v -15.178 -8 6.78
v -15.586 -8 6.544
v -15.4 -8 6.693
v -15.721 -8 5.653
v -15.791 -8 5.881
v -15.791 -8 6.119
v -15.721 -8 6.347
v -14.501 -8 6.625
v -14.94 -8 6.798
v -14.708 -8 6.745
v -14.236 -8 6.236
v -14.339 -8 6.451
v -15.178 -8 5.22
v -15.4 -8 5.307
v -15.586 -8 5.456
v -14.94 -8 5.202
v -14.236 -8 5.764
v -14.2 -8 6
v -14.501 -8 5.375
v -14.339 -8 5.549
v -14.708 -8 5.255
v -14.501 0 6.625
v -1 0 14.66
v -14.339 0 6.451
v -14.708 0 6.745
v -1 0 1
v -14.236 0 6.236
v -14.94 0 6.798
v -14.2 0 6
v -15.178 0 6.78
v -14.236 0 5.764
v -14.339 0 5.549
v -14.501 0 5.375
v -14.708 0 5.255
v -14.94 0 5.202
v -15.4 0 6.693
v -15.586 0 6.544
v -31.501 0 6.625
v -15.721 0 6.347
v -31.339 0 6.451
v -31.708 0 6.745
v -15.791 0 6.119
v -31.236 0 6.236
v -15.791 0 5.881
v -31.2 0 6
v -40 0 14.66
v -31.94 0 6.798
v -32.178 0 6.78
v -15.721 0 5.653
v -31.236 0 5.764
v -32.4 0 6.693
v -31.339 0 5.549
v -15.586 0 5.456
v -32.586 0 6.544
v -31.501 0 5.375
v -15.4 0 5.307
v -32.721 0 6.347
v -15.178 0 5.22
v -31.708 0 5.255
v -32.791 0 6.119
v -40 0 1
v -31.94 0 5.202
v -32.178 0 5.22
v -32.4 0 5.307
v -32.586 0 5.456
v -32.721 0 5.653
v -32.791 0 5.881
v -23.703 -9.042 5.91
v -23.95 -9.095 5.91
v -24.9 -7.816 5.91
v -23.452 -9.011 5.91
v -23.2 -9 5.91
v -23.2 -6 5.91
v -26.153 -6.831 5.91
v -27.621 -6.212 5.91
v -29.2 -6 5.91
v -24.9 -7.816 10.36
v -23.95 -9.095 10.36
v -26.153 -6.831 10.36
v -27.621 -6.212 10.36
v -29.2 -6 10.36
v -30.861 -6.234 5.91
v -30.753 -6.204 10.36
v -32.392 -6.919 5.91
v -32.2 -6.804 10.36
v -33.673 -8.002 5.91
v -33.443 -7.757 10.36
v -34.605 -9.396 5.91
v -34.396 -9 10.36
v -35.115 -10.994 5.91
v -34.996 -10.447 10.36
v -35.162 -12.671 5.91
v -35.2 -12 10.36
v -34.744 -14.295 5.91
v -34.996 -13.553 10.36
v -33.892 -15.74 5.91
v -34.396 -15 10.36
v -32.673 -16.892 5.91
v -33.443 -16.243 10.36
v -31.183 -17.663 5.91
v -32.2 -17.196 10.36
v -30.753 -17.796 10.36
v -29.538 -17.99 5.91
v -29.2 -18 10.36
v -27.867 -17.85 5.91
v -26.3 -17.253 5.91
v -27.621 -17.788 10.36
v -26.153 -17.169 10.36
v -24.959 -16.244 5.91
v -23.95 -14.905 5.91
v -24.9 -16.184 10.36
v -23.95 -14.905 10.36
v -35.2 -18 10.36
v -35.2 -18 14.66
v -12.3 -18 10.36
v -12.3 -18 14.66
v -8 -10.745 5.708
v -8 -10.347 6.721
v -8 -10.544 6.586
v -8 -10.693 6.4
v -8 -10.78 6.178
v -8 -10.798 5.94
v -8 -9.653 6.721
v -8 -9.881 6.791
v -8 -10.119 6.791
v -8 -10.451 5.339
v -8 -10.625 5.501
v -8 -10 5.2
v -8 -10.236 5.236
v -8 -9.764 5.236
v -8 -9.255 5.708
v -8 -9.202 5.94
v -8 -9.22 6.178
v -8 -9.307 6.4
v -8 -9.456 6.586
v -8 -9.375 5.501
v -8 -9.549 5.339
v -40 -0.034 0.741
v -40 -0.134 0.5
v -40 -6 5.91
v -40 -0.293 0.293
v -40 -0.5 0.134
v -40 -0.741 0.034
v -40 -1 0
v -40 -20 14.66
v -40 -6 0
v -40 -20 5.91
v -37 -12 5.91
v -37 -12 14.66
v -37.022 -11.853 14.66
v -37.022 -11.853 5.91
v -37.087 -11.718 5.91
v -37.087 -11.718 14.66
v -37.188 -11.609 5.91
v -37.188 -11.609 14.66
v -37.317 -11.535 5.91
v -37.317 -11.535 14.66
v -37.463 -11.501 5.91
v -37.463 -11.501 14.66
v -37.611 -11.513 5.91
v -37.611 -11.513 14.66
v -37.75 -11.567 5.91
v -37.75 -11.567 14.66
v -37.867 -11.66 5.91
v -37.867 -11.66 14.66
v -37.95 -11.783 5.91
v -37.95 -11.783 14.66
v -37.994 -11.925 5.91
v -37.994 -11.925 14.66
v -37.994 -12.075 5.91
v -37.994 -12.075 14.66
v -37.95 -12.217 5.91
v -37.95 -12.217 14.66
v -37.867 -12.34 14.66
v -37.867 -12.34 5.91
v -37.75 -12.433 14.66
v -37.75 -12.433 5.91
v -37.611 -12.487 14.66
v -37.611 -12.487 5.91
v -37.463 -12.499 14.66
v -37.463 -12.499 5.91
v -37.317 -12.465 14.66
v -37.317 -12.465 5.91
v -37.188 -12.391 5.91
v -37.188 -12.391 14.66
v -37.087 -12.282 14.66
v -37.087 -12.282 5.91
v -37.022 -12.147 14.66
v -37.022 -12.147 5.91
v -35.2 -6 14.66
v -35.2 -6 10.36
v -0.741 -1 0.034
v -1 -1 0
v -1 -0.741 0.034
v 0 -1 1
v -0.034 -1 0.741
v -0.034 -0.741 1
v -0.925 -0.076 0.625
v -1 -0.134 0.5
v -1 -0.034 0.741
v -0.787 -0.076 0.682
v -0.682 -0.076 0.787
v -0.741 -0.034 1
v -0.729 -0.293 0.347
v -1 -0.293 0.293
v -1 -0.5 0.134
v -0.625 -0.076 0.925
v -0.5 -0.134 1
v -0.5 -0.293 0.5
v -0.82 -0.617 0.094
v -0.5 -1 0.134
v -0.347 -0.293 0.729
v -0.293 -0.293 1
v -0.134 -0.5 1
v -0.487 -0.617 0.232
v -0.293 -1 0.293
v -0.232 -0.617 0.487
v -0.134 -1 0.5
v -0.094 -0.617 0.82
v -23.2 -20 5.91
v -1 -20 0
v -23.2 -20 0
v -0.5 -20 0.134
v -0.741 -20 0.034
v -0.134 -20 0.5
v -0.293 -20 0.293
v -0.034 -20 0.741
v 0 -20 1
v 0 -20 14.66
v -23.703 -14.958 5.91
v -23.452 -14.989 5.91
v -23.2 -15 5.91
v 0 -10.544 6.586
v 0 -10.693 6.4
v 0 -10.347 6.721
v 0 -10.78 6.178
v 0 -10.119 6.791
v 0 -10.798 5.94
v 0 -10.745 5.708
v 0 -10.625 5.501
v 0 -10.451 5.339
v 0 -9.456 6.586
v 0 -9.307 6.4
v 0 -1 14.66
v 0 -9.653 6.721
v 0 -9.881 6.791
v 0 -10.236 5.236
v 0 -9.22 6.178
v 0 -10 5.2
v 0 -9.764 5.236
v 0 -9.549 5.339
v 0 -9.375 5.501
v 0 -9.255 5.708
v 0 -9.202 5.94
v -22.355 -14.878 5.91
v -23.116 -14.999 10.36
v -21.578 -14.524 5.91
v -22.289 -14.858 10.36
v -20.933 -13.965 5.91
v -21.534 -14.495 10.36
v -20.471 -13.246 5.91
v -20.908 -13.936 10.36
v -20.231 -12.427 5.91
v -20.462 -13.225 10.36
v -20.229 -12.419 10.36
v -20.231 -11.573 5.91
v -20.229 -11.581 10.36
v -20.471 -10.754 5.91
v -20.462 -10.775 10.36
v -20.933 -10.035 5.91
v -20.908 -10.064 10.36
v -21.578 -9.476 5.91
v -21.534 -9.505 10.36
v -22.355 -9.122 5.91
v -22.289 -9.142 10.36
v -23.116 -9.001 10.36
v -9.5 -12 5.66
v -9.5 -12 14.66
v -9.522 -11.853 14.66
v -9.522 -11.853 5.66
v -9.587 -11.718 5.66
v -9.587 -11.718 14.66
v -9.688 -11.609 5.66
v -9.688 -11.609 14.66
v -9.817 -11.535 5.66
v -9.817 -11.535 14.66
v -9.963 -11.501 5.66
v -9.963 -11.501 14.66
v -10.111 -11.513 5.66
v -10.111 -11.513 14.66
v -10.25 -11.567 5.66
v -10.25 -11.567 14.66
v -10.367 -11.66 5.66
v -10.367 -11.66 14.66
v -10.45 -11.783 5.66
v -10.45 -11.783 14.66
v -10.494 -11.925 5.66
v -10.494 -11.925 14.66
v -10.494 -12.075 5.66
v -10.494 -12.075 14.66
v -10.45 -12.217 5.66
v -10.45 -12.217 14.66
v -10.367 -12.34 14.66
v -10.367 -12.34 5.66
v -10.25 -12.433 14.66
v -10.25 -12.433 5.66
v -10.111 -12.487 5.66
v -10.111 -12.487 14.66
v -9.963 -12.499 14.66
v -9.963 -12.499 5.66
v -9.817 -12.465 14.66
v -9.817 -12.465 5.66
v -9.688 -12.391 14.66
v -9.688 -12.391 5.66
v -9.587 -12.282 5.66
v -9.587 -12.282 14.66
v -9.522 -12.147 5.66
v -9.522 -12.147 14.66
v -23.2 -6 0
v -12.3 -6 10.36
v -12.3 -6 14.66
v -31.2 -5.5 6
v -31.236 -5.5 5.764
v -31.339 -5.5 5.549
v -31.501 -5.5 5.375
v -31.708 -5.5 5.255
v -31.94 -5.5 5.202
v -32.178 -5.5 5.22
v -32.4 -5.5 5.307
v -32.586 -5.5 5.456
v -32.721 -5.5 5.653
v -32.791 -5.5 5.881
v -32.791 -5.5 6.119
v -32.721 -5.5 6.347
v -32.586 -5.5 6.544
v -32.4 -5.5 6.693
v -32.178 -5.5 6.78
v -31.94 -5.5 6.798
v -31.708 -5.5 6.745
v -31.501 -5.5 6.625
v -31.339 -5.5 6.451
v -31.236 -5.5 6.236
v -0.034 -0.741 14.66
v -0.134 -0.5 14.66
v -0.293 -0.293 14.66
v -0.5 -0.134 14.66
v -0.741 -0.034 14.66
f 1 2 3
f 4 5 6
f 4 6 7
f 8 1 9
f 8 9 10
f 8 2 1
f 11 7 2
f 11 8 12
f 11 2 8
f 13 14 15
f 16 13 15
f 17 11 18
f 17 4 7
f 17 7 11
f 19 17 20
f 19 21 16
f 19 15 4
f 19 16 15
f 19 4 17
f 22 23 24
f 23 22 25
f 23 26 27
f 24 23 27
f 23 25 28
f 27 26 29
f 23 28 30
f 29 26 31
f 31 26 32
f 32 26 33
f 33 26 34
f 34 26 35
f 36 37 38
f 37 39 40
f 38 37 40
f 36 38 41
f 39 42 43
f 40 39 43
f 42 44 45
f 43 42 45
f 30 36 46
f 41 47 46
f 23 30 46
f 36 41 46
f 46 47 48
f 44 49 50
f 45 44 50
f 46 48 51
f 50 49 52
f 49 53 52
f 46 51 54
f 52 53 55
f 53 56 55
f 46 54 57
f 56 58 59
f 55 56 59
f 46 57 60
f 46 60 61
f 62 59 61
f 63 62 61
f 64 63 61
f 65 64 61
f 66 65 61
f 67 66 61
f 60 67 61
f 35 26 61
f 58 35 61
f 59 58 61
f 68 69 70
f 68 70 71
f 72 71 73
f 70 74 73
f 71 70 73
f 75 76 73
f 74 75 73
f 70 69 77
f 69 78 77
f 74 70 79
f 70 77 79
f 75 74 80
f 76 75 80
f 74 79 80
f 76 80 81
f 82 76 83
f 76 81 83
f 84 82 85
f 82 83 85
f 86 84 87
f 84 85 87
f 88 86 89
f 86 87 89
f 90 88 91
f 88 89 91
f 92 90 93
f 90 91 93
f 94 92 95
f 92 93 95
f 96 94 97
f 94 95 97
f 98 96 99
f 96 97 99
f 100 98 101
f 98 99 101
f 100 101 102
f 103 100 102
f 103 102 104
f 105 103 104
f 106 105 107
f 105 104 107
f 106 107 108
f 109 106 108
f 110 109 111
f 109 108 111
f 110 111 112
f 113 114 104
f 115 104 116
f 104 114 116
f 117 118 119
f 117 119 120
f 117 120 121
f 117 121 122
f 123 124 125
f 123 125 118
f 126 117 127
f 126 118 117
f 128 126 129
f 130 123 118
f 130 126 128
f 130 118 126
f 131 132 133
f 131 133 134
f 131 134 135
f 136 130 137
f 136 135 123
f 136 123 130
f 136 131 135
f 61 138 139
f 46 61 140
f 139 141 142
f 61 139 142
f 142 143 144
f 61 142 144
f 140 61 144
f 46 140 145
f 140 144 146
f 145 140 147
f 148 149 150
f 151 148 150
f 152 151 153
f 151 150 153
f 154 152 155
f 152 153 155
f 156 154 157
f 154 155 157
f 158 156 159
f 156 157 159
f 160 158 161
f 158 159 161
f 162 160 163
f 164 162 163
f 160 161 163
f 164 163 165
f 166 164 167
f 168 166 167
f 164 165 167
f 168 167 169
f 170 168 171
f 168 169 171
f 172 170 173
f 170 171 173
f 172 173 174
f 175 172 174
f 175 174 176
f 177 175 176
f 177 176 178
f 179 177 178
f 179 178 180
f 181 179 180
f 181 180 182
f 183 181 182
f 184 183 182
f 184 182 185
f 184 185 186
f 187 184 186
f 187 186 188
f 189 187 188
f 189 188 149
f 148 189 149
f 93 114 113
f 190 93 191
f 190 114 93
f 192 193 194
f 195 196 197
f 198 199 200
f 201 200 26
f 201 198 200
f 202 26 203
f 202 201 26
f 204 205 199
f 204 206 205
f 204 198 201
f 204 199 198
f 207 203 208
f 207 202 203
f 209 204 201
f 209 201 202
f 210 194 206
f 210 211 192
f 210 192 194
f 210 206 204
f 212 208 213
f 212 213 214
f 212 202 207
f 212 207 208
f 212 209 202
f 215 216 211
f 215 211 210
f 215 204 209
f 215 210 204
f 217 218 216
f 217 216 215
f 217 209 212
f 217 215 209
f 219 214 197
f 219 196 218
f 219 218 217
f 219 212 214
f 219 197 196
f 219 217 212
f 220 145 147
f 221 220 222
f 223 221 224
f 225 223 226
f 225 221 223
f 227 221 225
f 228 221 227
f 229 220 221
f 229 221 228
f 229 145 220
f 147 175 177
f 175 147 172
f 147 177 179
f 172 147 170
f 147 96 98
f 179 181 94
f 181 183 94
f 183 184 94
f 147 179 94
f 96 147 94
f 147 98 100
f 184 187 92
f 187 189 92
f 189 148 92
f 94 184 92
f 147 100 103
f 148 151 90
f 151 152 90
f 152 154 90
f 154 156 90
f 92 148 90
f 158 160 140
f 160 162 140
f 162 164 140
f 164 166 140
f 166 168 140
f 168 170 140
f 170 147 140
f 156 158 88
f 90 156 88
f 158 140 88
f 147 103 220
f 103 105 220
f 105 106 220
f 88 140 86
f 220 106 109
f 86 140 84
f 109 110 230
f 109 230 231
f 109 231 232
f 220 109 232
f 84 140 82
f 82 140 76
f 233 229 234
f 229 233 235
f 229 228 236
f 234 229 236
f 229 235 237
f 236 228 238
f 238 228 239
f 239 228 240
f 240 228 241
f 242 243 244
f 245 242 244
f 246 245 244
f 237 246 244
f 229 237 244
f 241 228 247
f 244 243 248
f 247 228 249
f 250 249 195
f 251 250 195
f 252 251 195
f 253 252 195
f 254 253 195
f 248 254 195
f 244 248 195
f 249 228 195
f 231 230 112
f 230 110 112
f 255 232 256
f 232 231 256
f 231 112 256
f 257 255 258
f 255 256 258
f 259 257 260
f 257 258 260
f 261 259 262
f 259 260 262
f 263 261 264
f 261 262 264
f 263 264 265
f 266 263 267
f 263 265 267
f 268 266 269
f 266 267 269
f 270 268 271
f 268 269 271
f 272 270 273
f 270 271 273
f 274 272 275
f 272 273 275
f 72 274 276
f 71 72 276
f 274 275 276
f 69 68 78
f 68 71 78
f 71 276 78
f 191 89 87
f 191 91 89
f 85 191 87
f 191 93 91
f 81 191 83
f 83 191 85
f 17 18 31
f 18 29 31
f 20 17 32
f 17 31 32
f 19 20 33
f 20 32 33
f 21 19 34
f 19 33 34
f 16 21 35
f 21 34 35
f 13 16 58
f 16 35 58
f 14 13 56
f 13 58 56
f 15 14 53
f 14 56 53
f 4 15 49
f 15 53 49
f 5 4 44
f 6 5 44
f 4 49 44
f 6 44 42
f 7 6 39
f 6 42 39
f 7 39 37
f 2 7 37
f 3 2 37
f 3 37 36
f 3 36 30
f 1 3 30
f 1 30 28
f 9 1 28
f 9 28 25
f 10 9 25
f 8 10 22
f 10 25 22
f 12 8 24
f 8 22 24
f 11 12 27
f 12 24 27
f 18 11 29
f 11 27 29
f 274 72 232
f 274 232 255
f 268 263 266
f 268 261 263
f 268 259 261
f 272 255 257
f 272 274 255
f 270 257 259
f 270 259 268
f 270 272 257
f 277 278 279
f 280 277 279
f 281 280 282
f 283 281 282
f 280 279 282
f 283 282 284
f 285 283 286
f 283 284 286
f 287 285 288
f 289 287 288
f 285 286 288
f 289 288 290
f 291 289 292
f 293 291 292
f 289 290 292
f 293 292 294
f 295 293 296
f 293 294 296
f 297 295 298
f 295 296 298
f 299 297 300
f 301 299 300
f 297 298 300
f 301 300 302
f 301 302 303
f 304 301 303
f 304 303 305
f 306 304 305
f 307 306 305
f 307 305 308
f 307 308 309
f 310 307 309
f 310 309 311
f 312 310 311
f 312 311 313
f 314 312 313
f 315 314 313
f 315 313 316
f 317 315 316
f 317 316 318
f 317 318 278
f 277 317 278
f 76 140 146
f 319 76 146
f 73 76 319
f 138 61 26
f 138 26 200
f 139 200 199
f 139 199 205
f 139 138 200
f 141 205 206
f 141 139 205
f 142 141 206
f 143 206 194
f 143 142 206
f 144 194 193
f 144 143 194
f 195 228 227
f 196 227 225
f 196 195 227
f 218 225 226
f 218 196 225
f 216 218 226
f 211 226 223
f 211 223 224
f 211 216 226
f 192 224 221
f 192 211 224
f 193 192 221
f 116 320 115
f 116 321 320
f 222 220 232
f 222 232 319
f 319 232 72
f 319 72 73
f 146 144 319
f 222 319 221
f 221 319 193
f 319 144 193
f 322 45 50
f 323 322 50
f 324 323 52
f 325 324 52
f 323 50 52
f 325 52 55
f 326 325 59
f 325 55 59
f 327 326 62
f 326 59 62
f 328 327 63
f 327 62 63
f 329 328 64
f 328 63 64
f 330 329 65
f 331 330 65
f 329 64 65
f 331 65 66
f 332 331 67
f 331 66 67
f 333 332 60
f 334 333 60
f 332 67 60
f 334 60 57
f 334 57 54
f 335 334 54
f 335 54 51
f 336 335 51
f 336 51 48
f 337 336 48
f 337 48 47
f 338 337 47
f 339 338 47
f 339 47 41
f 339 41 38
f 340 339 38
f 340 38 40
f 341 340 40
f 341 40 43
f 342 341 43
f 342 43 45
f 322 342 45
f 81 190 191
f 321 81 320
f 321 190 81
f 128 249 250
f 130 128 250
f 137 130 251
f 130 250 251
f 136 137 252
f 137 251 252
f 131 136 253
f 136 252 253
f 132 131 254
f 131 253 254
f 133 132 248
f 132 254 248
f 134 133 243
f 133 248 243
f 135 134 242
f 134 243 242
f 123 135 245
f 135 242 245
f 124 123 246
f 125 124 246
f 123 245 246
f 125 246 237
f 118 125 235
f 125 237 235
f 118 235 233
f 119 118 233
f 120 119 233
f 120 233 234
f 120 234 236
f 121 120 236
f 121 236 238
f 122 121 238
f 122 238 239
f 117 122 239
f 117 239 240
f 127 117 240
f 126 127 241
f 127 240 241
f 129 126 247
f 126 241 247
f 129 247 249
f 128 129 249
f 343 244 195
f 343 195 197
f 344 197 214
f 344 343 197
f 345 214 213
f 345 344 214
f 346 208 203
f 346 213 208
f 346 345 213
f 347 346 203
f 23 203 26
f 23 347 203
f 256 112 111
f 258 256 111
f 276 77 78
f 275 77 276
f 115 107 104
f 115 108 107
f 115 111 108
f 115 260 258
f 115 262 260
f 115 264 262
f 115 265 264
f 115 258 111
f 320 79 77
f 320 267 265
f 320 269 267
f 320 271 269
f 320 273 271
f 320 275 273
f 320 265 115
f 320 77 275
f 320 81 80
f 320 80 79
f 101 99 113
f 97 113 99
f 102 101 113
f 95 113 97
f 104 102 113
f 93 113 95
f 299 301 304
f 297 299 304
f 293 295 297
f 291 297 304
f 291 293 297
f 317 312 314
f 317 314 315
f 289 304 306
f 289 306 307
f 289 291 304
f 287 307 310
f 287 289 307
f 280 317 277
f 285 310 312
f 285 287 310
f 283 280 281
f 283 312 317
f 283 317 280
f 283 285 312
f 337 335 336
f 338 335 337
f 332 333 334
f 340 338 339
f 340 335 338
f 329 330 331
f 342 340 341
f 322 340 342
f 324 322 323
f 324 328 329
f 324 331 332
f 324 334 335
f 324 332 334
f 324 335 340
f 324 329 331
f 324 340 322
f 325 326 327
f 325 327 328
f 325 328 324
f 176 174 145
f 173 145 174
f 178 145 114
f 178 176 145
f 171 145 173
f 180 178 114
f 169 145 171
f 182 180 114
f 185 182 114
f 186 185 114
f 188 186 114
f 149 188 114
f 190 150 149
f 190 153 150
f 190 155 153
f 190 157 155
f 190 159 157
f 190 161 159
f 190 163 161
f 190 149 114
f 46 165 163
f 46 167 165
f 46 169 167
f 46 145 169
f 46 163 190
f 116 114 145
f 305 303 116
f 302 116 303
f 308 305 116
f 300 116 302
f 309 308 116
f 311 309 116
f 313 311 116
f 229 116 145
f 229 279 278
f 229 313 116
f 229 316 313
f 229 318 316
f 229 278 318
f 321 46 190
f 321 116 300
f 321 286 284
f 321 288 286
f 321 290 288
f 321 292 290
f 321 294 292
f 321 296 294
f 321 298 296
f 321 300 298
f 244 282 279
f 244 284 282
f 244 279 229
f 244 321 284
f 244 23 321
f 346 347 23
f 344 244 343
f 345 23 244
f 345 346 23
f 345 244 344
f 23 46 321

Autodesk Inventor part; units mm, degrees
ref_plane "YZ Plane" through (0, 0, 0) normal (1, 0, 0) x (0, 1, 0)
ref_plane "XZ Plane" through (0, 0, 0) normal (0, 1, 0) x (-1, 0, 0)
ref_plane "XY Plane" through (0, 0, 0) normal (0, 0, 1) x (1, 0, 0)
sketch "Sketch1" plane through (0, 0, 0) normal (0, 0, 1) x (1, 0, 0)
  line L0 (0, 0) -> (-40, 0)
  line L1 (-40, 0) -> (-40, -18)
  line L2 (-40, -18) -> (0, -18)
  line L3 (0, -18) -> (0, 0)
  dimension "d0" = 40
  dimension "d1" = 18
extrude "Extrusion1" add sketch "Sketch1" along normal blind 14.66
sketch "Sketch2" plane through (0, 0, 14.66) normal (0, 0, 1) x (1, 0, 0)
  circle A0 centre (-37.5, -12) radius 0.5
  circle A1 centre (-10, -12) radius 0.5
  line L0 (-40, -18) -> (0, -18) projected
  line L1 (-40, 0) -> (-40, -18) projected
  line L2 (-35.2, -6) -> (-12.3, -6)
  line L3 (-12.3, -6) -> (-12.3, -18)
  line L4 (-12.3, -18) -> (-35.2, -18)
  line L5 (-35.2, -18) -> (-35.2, -6)
  circle A2 centre (-29.2, -12) radius 6
  circle A3 centre (-23.2, -12) radius 3
  point P0 (0, 0)
  point P1 (-23.95, -9.0953)
  point P2 (-23.95, -14.9047)
  dimension "d4" = 1
  dimension "d5" = 1
  dimension "d6" = 6
  dimension "d7" = 6
  dimension "d8" = 27.5
  dimension "d9" = 2.5
  dimension "d10" = 12
  dimension "d11" = 4.8
  dimension "d12" = 2.3
  dimension "d17" = 6
  dimension "d18" = 6
extrude "Extrusion2" cut sketch "Sketch2" against normal blind 4.3 contours L5 A2 L0 | A2 A3 L2 L3 L0 | A2 A3 | L5 L2 A2 | A3 A2 | A2 A3
extrude "Extrusion3" cut sketch "Sketch2" against normal blind 9 contours A0 | A1
extrude "Extrusion4" cut sketch "Sketch2" against normal blind 8.75 contours A2 A3 | A3 A2 | A2 A3
sketch "Sketch3" plane through (0, 0, 5.91) normal (0, 0, 1) x (1, 0, 0)
  line L0 (-29.2, -6) -> (-12.3, -6) projected
  line L1 (-23.2, -6) -> (-41.4611, -6)
  line L2 (-41.4611, -6) -> (-41.4611, -19.254)
  line L3 (-41.4611, -19.254) -> (-23.2, -19.254)
  line L4 (-23.2, -19.254) -> (-23.2, -6)
  point P0 (0, 0)
  dimension "d21" = 23.2
extrude "Extrusion5" cut sketch "Sketch3" against normal blind 8.75
sketch "Sketch4" plane through (0, -18, 0) normal (0, -1, 0) x (1, 0, 0)
  line L0 (0, 0) -> (0, 14.66) projected
  line L1 (-23.95, 5.91) -> (-23.2, 5.91) projected
  line L2 (0, 0) -> (-23.2, 0)
  line L3 (-23.2, 0) -> (-23.2, 5.91)
  line L4 (-23.2, 5.91) -> (0, 5.91)
  line L5 (0, 5.91) -> (0, 0)
  line L6 (0, 14.66) -> (-40, 14.66) projected
  line L7 (0, 5.91) -> (-40, 5.91)
  line L8 (-40, 5.91) -> (-40, 14.66)
  line L9 (-40, 14.66) -> (0, 14.66)
  line L10 (0, 14.66) -> (0, 5.91)
extrude "Extrusion6" add sketch "Sketch4" along normal blind 2
fillet "Fillet1" radius 1 3 edges at (0, -10, 0) (-20, 0, 0) (0, 0, 7.33)
sketch "Sketch5" plane through (0, -20, 1) normal (1, 0, 0) x (0, 0, -1)
  circle A0 centre (-5, 10) radius 0.8
  line L0 (1, 0) -> (1, 19) projected
  line L1 (0, 0) -> (-13.66, 0) projected
  point P0 (1, 20)
  dimension "d27" = 1.6
  dimension "d28" = 6
  dimension "d29" = 10
extrude "Extrusion7" cut sketch "Sketch5" against normal blind 8
sketch "Sketch6" plane through (-40, 0, 1) normal (0, 1, 0) x (1, 0, 0)
  circle A0 centre (25, -5) radius 0.8
  circle A1 centre (8, -5) radius 0.8
  line L0 (39, 1) -> (0, 1) projected
  line L1 (40, -13.66) -> (40, 0) projected
  line L2 (0, 0) -> (0, -13.66) projected
  point P0 (40, 1)
  dimension "d32" = 1.6
  dimension "d33" = 1.6
  dimension "d34" = 6
  dimension "d35" = 6
  dimension "d36" = 15
  dimension "d37" = 8
extrude "Extrusion8" cut sketch "Sketch6" against normal blind 8 contours A0
extrude "Extrusion9" cut sketch "Sketch6" against normal blind 5.5 contours A1
equation "\"d5\" = d4"
equation "\"d6\" = 0.5 * d10"
equation "\"d7\" = d6"
equation "\"d17\" = 0.5 * d10"
equation "\"d32\" = d27"
equation "\"d33\" = d27"
properties part number "ServoMount_a"
